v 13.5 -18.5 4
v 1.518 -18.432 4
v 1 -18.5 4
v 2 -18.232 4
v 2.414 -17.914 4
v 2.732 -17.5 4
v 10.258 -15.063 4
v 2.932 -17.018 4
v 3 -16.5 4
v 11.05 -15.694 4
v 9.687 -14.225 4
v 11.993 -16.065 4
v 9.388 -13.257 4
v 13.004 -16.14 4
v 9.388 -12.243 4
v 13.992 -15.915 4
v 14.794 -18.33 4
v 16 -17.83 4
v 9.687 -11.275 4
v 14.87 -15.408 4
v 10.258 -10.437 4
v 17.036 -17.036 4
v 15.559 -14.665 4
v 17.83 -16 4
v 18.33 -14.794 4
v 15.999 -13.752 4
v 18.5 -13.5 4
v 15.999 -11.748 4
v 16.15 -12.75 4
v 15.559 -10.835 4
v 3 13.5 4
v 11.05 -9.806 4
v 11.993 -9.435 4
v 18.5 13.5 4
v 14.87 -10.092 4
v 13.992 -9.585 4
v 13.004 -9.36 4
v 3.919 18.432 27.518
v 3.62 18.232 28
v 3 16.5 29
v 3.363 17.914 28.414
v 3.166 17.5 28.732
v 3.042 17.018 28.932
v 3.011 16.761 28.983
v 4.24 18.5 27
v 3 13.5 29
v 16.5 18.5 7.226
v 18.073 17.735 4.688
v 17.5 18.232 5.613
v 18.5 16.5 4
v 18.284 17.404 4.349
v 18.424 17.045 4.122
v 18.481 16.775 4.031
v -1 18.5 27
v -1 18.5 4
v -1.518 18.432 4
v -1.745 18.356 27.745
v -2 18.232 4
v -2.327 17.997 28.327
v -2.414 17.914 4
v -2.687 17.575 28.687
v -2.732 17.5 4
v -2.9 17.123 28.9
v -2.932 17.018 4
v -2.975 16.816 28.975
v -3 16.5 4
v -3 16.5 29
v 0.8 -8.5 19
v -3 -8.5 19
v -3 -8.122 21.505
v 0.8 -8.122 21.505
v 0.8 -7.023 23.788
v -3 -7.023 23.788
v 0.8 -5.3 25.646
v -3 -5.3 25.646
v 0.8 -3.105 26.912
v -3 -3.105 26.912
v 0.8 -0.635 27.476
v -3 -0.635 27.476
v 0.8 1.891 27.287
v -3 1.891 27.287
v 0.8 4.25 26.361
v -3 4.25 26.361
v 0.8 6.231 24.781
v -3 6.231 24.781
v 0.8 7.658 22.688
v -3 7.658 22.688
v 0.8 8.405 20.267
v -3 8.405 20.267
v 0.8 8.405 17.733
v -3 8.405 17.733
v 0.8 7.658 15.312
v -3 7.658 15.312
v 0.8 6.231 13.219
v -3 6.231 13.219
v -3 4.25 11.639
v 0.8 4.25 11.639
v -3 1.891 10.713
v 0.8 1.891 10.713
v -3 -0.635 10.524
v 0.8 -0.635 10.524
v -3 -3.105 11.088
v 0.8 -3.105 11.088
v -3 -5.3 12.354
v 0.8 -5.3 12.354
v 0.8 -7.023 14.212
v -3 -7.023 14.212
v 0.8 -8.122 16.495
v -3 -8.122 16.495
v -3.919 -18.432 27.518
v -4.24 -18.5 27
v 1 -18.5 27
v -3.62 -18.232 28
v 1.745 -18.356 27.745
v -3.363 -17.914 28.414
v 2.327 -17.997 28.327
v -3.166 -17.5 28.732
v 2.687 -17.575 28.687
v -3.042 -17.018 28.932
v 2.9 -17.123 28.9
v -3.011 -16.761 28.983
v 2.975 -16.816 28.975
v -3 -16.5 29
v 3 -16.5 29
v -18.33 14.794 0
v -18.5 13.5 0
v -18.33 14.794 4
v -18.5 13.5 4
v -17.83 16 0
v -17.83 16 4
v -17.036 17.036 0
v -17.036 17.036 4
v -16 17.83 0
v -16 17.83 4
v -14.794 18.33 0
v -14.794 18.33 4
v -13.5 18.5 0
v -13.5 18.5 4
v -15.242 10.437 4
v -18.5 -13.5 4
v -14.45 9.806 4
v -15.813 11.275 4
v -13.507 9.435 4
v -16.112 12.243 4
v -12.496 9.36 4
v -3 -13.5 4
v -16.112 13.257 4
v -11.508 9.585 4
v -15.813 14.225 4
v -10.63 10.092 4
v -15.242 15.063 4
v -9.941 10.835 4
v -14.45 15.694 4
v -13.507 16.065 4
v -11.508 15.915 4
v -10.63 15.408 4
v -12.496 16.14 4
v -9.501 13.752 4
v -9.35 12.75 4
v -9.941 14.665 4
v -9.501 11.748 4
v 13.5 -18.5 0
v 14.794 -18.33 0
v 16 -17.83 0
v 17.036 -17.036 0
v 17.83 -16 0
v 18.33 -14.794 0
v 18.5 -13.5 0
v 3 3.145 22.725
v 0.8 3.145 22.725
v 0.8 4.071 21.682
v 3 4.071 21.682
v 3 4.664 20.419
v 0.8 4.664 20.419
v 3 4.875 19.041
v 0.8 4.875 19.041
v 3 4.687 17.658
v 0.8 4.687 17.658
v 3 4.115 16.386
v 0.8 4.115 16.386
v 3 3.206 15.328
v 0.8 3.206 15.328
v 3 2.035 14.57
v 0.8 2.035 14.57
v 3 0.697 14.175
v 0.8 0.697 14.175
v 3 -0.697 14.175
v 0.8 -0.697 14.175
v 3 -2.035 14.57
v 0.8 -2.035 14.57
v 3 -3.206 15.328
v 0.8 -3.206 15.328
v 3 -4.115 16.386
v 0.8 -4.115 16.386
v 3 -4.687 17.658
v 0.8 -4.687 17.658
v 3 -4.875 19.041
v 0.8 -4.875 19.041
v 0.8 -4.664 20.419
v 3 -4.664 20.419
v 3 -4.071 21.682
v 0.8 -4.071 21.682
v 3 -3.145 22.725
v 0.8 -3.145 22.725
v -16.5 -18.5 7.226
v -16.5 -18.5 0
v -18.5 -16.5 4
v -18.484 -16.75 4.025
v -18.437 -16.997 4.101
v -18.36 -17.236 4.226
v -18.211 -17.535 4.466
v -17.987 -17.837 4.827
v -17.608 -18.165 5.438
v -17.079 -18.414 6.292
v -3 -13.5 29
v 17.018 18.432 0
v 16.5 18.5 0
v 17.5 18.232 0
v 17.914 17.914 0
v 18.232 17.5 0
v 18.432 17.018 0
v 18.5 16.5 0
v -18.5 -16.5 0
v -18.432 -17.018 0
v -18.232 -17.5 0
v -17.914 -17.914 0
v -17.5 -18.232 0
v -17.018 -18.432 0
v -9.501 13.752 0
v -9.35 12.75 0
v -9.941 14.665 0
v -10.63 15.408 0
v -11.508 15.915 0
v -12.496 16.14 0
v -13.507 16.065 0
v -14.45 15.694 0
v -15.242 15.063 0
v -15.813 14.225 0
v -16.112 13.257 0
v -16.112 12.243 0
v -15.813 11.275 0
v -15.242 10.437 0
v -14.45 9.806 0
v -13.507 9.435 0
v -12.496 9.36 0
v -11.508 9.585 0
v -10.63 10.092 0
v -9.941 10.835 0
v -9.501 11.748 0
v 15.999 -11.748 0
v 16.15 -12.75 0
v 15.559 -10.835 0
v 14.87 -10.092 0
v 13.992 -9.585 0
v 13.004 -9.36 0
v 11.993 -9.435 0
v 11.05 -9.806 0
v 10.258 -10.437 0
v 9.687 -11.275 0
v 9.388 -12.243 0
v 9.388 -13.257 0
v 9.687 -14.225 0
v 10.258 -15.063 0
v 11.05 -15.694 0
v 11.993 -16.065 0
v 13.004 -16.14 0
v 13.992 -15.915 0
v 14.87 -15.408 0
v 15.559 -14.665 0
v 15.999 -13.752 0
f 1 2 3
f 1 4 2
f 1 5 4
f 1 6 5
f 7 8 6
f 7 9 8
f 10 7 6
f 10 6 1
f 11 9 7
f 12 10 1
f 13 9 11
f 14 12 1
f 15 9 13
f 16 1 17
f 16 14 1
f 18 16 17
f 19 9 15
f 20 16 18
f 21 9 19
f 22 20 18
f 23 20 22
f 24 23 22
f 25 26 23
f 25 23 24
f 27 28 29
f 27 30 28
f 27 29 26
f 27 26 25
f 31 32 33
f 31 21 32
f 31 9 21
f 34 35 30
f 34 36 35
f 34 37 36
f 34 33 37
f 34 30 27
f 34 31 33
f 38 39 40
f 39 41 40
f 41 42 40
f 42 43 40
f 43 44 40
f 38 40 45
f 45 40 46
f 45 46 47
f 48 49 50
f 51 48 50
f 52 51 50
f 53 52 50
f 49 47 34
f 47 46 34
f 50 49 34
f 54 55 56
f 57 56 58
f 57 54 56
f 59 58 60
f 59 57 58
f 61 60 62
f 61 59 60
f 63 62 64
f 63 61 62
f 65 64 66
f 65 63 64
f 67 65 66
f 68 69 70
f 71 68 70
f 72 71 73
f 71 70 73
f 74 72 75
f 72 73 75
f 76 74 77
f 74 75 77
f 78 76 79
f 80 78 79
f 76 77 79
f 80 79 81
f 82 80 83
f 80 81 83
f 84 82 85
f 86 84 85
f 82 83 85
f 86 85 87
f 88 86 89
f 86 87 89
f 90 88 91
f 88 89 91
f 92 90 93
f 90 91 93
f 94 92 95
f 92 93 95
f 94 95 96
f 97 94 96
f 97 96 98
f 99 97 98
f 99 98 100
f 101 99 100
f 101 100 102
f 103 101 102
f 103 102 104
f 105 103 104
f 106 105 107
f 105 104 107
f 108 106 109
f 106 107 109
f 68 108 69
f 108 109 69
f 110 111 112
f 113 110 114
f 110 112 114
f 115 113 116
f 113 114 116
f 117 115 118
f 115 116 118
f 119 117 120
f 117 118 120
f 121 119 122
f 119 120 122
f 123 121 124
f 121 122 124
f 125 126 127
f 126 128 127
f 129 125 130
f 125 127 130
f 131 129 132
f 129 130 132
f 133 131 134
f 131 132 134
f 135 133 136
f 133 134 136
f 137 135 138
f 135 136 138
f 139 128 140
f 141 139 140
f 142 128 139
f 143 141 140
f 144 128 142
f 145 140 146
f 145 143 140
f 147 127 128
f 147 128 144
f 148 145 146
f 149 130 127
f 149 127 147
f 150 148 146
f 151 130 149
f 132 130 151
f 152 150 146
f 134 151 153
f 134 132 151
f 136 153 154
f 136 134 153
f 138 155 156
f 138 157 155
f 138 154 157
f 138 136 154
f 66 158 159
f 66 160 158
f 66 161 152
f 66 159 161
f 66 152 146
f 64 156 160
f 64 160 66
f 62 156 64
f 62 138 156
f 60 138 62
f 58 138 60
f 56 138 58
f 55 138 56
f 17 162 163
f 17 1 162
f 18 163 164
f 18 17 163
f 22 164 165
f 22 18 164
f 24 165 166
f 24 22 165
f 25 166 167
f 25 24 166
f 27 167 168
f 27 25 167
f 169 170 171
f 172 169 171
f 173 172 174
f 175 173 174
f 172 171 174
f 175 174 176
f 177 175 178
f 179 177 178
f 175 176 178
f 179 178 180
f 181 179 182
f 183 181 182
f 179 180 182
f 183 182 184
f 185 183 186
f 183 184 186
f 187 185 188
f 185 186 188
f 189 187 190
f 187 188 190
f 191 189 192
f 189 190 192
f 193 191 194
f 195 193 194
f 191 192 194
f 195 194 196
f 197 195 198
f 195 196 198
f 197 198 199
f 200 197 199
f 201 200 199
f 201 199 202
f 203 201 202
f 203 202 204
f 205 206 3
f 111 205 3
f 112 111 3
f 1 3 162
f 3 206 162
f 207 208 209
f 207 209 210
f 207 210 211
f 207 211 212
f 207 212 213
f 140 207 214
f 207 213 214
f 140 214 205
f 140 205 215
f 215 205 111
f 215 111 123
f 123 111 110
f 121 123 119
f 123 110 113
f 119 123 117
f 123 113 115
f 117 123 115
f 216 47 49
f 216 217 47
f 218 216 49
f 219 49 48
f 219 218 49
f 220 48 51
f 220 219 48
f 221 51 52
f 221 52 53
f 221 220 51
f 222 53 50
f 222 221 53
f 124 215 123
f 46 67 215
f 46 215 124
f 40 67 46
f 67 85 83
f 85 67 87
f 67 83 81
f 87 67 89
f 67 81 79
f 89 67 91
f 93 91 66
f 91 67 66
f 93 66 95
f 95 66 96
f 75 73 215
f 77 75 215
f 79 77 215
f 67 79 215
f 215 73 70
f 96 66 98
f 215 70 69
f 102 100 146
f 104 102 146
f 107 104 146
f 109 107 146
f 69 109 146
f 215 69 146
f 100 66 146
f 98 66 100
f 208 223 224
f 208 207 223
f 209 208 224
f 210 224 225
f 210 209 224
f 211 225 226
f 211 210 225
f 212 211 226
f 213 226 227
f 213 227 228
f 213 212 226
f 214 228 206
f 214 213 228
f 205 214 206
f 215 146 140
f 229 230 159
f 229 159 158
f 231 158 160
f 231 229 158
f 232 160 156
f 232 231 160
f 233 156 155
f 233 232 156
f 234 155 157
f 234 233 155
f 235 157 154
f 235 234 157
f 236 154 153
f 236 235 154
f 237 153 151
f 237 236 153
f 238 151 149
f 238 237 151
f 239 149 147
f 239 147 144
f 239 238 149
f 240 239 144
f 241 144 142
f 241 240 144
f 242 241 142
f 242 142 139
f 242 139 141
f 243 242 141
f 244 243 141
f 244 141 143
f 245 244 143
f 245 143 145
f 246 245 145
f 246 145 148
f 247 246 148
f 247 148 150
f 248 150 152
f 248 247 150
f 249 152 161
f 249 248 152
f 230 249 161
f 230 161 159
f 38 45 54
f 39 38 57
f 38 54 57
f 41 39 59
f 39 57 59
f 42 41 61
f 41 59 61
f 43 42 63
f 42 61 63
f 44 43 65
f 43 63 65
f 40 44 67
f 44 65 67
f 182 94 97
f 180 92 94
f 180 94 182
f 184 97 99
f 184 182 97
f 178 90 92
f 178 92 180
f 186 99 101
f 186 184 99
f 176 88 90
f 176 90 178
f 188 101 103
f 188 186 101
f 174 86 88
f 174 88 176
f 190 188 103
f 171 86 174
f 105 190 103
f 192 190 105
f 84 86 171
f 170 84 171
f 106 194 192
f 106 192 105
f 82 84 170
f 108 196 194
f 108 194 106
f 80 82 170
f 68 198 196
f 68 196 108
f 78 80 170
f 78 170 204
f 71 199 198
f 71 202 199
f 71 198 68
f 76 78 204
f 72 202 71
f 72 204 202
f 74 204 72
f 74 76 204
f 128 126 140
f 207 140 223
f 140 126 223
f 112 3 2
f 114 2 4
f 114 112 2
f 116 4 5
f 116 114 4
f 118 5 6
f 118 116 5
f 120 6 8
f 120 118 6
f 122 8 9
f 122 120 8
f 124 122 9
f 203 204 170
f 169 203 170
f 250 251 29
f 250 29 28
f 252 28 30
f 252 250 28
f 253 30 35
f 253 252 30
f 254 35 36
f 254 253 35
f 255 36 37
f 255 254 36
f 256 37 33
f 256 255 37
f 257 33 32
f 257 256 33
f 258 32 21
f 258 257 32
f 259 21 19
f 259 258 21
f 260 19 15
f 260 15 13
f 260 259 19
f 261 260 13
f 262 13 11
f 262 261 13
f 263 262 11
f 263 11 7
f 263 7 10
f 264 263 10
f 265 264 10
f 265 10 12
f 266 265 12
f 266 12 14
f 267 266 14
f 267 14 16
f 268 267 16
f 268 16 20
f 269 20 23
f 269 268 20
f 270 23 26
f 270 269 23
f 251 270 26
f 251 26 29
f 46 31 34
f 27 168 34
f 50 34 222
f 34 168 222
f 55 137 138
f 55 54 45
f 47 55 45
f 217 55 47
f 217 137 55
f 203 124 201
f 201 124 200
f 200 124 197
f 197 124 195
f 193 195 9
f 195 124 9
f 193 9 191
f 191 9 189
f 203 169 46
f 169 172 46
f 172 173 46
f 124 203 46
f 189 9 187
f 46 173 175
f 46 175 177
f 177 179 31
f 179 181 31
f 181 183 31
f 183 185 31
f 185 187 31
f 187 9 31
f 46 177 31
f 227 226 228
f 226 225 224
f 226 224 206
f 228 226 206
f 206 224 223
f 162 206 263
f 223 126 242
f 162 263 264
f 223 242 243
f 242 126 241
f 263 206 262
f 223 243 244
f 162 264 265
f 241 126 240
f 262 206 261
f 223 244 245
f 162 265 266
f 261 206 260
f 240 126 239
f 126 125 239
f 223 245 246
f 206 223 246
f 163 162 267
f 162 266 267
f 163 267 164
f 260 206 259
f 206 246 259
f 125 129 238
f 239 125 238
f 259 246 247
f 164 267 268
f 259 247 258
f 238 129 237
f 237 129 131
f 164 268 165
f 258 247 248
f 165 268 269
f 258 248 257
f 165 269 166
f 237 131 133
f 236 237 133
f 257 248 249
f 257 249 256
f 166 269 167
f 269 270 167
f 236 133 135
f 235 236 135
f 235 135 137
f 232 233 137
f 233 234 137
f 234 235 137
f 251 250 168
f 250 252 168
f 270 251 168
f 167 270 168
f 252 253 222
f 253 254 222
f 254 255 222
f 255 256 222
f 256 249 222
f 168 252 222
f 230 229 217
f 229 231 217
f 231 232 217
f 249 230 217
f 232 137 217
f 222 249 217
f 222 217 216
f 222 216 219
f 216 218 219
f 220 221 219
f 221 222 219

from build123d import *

# Parameters (mm, degrees)
F0_W     = 37
F0_H     = 37
F0_R     = 3.4
F1_DEPTH = 4
F3_DEPTH = 25
F5_DEPTH = 37.001
F7_DEPTH = 21.501
F8_R     = 8.5
F9_DEPTH = 3.8
F10_R    = 5
F11_R    = 2


with BuildPart() as f1:
    # F0 (on Top) → F1 (new body)
    with BuildSketch(Plane.XY):
        Rectangle(F0_W, F0_H)
        with Locations((12.75, -12.75)):
            Circle(F0_R, mode=Mode.SUBTRACT)
        with Locations((-12.75, 12.75)):
            Circle(F0_R, mode=Mode.SUBTRACT)
    extrude(amount=F1_DEPTH)

    # F2 (on face) → F3 (join)
    with BuildSketch(Plane.XY.offset(4)):
        Polygon((-18.5, -13.5), (-18.5, -18.5), (3, -18.5), (3, 13.5), (18.5, 13.5), (18.5, 18.5), (-3, 18.5), (-3, -13.5), align=None)
    extrude(amount=F3_DEPTH)

    # F4 (on face) → F5 (cut, through all)
    with BuildSketch(Plane.XZ.offset(18.5)):
        Polygon((-3, 29), (-18.5, 29), (-18.5, 4), align=None)
        Polygon((18.5, 29), (3, 29), (18.5, 4), align=None)
    extrude(amount=-F5_DEPTH, mode=Mode.SUBTRACT)

    # F6 (on face) → F7 (cut, through all)
    with BuildSketch(Plane(origin=(-3, 0, 0), x_dir=(0, -1, 0), z_dir=(-1, 0, 0))):
        with BuildLine():
            Line((3.1448370387, 22.725), (-3.1448370387, 22.725))
            ThreePointArc((-3.1448370387, 22.725), (0, 14.125), (3.1448370387, 22.725))
        make_face()
    extrude(amount=-F7_DEPTH, mode=Mode.SUBTRACT)

    # F8 (on face) → F9 (cut)
    with BuildSketch(Plane(origin=(-3, 0, 0), x_dir=(0, -1, 0), z_dir=(-1, 0, 0))):
        with Locations((0, 19)):
            Circle(F8_R)
    extrude(amount=-F9_DEPTH, mode=Mode.SUBTRACT)

    # F10
    f10_edges = [f1.edges().sort_by_distance(p)[0] for p in [
        (-18.5, 18.5, 2),
        (18.5, -18.5, 2),
    ]]
    fillet(f10_edges, radius=F10_R)

    # F11
    f11_edges = [f1.edges().sort_by_distance(p)[0] for p in [
        (0, -18.5, 29),
        (0, 18.5, 29),
        (-18.5, -18.5, 2),
        (18.5, 18.5, 2),
        (-3, 18.5, 16.5),
        (3, -18.5, 16.5),
    ]]
    fillet(f11_edges, radius=F11_R)


solid = f1.part
